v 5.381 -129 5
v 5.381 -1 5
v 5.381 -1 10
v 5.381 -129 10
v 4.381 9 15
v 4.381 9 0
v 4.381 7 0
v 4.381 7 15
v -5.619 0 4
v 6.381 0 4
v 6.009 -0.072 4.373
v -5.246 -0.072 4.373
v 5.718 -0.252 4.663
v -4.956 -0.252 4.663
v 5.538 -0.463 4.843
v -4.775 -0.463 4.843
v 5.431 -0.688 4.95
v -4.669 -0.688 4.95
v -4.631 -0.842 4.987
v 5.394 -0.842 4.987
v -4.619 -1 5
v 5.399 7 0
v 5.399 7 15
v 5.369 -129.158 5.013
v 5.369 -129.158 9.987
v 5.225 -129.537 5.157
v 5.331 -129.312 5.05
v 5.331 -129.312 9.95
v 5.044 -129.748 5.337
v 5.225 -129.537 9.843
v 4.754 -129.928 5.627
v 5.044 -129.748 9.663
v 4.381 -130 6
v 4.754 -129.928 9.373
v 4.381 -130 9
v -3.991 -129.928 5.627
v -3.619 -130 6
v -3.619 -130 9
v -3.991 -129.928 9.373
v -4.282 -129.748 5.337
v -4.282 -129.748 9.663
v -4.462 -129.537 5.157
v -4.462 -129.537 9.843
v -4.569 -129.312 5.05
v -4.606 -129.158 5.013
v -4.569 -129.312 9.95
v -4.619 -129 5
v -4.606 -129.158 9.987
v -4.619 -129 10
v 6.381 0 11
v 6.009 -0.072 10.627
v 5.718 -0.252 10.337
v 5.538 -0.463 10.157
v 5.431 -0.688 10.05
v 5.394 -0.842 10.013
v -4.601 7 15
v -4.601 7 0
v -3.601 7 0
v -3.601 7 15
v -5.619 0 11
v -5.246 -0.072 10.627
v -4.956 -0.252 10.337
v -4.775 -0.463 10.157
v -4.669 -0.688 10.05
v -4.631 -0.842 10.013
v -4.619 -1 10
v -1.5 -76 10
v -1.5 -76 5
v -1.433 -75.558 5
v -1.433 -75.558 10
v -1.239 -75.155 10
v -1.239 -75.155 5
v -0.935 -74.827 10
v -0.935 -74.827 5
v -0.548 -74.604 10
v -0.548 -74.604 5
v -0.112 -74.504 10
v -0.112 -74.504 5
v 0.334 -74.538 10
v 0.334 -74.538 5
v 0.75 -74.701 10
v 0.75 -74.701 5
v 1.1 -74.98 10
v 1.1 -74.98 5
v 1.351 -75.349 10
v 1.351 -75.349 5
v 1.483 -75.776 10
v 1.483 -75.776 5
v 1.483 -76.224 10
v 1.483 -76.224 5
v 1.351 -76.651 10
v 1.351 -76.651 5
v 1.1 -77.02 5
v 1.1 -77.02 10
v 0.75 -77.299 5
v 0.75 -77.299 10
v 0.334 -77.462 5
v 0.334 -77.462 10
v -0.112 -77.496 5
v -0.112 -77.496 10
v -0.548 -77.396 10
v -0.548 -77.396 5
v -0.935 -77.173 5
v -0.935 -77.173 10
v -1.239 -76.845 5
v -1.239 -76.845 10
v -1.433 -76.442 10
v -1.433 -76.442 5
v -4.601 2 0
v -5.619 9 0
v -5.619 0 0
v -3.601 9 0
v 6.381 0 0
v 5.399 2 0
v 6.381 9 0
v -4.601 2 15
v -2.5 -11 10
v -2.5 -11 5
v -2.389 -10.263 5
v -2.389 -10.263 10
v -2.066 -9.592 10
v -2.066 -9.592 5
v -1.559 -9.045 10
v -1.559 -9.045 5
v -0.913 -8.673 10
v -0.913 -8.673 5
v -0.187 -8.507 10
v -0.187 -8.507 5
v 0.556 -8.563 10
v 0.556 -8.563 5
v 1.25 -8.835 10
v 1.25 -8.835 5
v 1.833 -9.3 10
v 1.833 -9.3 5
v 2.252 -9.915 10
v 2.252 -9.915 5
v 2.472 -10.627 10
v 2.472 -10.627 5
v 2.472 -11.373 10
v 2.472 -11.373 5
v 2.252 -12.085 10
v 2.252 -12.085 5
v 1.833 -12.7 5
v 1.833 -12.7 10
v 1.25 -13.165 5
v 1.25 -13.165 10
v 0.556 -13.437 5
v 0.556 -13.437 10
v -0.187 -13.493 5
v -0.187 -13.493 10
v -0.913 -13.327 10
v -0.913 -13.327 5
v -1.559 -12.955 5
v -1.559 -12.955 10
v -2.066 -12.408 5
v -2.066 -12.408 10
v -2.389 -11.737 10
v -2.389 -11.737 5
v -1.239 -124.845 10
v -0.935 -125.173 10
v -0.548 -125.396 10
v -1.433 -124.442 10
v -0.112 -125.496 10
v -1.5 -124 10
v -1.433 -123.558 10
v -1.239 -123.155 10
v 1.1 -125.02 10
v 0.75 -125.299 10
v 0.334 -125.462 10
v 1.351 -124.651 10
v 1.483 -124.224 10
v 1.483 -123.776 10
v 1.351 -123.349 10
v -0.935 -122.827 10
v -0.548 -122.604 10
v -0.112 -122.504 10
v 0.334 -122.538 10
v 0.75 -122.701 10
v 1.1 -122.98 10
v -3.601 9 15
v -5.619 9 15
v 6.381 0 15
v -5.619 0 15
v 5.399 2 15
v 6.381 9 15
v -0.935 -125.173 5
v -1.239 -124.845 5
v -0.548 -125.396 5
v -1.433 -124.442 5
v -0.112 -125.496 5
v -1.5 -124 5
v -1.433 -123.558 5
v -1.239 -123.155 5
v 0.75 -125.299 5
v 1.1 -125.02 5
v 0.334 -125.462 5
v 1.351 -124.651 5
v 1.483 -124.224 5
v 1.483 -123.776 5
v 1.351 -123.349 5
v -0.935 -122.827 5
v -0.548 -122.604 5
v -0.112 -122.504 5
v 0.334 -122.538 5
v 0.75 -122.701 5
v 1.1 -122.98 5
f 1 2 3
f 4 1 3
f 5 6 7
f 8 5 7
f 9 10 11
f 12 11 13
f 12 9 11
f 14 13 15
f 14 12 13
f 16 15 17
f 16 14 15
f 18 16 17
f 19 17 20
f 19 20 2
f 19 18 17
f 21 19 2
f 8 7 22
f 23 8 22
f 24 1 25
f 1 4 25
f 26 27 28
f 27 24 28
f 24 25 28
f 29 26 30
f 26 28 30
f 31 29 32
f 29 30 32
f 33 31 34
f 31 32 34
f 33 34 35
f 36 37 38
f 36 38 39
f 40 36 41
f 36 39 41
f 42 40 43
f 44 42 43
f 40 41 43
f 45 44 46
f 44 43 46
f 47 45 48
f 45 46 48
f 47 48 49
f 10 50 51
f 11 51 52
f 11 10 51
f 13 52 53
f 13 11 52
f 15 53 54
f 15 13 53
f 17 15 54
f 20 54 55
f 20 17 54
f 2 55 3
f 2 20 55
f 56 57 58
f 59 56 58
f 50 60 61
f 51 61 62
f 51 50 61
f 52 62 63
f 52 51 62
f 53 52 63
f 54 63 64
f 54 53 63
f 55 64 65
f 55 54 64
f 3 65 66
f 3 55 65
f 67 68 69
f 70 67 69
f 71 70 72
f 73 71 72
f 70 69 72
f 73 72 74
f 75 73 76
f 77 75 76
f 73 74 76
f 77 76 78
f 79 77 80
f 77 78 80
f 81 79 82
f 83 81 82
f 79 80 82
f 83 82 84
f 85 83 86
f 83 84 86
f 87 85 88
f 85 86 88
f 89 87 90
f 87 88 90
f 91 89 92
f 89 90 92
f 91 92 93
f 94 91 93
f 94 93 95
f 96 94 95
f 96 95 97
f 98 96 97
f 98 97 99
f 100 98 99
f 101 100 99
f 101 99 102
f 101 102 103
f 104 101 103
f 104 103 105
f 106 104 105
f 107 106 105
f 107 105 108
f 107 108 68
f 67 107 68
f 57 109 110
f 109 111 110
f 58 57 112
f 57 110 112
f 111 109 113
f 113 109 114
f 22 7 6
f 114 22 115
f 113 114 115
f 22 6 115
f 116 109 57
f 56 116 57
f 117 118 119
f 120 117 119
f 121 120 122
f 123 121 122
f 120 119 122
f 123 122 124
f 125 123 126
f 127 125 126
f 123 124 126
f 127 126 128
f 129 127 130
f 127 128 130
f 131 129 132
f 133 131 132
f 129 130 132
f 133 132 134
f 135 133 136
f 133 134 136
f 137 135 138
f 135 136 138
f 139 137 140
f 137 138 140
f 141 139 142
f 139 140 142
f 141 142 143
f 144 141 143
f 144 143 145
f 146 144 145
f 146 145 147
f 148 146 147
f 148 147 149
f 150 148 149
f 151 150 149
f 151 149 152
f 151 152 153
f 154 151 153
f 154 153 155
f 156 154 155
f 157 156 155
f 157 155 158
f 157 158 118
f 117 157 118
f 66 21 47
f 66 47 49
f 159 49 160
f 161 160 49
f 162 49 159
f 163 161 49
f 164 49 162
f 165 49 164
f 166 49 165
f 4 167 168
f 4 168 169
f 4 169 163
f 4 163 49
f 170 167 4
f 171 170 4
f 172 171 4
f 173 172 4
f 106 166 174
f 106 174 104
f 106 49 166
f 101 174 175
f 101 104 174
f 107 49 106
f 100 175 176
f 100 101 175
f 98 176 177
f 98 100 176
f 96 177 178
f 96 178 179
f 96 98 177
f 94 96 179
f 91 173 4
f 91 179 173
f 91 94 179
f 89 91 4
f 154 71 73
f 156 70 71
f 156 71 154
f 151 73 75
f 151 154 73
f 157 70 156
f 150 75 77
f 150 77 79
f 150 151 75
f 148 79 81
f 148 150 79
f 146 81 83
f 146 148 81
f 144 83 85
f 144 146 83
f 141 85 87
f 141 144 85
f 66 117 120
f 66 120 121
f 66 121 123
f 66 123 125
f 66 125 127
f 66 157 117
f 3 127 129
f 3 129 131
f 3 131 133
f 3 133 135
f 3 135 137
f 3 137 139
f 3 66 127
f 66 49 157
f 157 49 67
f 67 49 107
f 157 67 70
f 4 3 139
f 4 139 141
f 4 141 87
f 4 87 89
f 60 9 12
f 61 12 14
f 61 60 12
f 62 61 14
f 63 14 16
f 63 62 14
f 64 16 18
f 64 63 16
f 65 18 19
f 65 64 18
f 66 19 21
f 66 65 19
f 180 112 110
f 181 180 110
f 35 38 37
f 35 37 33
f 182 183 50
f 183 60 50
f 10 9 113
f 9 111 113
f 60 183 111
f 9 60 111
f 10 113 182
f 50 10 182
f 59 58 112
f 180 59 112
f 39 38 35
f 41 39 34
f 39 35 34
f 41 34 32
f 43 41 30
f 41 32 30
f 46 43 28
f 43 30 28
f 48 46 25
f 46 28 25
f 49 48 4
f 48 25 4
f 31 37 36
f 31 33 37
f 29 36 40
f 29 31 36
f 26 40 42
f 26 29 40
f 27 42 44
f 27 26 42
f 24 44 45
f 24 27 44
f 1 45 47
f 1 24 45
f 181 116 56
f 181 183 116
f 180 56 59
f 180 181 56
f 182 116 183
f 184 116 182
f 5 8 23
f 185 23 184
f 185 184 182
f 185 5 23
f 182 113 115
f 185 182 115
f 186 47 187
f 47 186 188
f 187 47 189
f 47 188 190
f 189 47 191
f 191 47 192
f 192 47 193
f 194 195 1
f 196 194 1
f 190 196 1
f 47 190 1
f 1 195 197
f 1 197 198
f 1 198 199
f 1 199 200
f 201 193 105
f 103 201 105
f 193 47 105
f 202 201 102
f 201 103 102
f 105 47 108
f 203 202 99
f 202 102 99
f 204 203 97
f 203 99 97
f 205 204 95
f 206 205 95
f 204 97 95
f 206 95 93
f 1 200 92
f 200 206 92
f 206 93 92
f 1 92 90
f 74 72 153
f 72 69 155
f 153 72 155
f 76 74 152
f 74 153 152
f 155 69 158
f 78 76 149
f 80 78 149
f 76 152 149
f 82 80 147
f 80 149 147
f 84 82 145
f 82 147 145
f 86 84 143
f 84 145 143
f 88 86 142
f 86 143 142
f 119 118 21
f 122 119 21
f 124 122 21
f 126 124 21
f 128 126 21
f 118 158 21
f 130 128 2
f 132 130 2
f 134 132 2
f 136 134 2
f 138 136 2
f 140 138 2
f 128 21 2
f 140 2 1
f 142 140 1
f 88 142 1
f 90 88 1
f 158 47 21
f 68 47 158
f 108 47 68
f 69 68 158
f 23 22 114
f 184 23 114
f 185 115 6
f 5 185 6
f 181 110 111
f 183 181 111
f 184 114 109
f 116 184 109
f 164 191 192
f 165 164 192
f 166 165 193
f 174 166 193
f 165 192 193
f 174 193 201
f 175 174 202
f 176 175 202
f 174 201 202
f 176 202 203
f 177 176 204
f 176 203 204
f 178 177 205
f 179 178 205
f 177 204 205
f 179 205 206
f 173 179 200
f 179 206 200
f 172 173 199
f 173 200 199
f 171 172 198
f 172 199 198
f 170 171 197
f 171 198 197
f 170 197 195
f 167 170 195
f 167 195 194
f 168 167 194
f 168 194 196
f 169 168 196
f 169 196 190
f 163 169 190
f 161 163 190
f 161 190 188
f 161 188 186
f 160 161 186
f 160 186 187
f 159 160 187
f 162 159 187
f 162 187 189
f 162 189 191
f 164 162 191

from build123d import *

# Parameters (mm, degrees)
BOSS_EXTRUDE1_DEPTH = 15
SKETCH2_W           = 10
SKETCH2_H           = 5
BOSS_EXTRUDE2_DEPTH = 130
FILLET3_R           = 1
FILLET4_R           = 1
FILLET5_R           = 1
FILLET6_R           = 1
CUT_EXTRUDE1_REACH  = 132.54
SKETCH3_R           = 2.5
SKETCH3_R_2         = 1.5


with BuildPart() as part:
    # Sketch1 → Boss-Extrude1 (new body)
    with BuildSketch(Plane.XY):
        Polygon((-5.618855965, 9), (-5.618855965, 0), (6.381144035, 0), (6.381144035, 9), (4.381144035, 9), (4.381144035, 7), (5.399108107, 7), (5.399108107, 2), (-4.600891893, 2), (-4.600891893, 7), (-3.600891893, 7), (-3.600891893, 9), align=None)
    extrude(amount=BOSS_EXTRUDE1_DEPTH)

    # Sketch2 → Boss-Extrude2 (add)
    with BuildSketch(Plane.XZ):
        with Locations((0.381144035, 7.5)):
            Rectangle(SKETCH2_W, SKETCH2_H)
    extrude(amount=BOSS_EXTRUDE2_DEPTH)

    # Fillet3
    fillet3_edges = [part.edges().sort_by_distance(p)[0] for p in [
        (0.381144035, 0, 10),
        (-4.618855965, 0, 7.5),
    ]]
    fillet(fillet3_edges, radius=FILLET3_R - 0.0001)  # a hair under: the kernel refuses the full size

    # Fillet4
    fillet4_edges = [part.edges().sort_by_distance(p)[0] for p in [
        (-0.118805965, 0, 5),
    ]]
    fillet(fillet4_edges, radius=FILLET4_R - 0.0001)  # a hair under: the kernel refuses the full size

    # Fillet5
    fillet5_edges = [part.edges().sort_by_distance(p)[0] for p in [
        (5.381144035, 0, 7.5),
    ]]
    fillet(fillet5_edges, radius=FILLET5_R - 0.0001)  # a hair under: the kernel refuses the full size

    # Fillet6
    fillet6_edges = [part.edges().sort_by_distance(p)[0] for p in [
        (-4.618855965, -130, 7.5),
        (0.381144035, -130, 5),
        (0.381144035, -130, 10),
        (5.381144035, -130, 7.5),
    ]]
    fillet(fillet6_edges, radius=FILLET6_R)

    # Sketch3 → Cut-Extrude1 (cut, up to next)
    with BuildSketch(Plane(origin=(0, 0, 5), x_dir=(-1, 0, 0), z_dir=(0, 0, -1)), mode=Mode.PRIVATE) as cut_extrude1_sk1:
        with Locations((0, -11)):
            Circle(SKETCH3_R)
    cut_extrude1_tool1 = extrude(cut_extrude1_sk1.sketch, amount=-CUT_EXTRUDE1_REACH, mode=Mode.PRIVATE) & part.part
    # Sketch3 → Cut-Extrude1 (cut, up to next)
    with BuildSketch(Plane(origin=(0, 0, 5), x_dir=(-1, 0, 0), z_dir=(0, 0, -1)), mode=Mode.PRIVATE) as cut_extrude1_sk2:
        with Locations((0, -124)):
            Circle(SKETCH3_R_2)
    cut_extrude1_tool2 = extrude(cut_extrude1_sk2.sketch, amount=-CUT_EXTRUDE1_REACH, mode=Mode.PRIVATE) & part.part
    # Sketch3 → Cut-Extrude1 (cut, up to next)
    with BuildSketch(Plane(origin=(0, 0, 5), x_dir=(-1, 0, 0), z_dir=(0, 0, -1)), mode=Mode.PRIVATE) as cut_extrude1_sk3:
        with Locations((0, -76)):
            Circle(SKETCH3_R_2)
    cut_extrude1_tool3 = extrude(cut_extrude1_sk3.sketch, amount=-CUT_EXTRUDE1_REACH, mode=Mode.PRIVATE) & part.part
    add(cut_extrude1_tool1.solids().sort_by_distance((0, -11, 5))[0], mode=Mode.SUBTRACT)
    add(cut_extrude1_tool2.solids().sort_by_distance((0, -124, 5))[0], mode=Mode.SUBTRACT)
    add(cut_extrude1_tool3.solids().sort_by_distance((0, -76, 5))[0], mode=Mode.SUBTRACT)


solid = part.part
